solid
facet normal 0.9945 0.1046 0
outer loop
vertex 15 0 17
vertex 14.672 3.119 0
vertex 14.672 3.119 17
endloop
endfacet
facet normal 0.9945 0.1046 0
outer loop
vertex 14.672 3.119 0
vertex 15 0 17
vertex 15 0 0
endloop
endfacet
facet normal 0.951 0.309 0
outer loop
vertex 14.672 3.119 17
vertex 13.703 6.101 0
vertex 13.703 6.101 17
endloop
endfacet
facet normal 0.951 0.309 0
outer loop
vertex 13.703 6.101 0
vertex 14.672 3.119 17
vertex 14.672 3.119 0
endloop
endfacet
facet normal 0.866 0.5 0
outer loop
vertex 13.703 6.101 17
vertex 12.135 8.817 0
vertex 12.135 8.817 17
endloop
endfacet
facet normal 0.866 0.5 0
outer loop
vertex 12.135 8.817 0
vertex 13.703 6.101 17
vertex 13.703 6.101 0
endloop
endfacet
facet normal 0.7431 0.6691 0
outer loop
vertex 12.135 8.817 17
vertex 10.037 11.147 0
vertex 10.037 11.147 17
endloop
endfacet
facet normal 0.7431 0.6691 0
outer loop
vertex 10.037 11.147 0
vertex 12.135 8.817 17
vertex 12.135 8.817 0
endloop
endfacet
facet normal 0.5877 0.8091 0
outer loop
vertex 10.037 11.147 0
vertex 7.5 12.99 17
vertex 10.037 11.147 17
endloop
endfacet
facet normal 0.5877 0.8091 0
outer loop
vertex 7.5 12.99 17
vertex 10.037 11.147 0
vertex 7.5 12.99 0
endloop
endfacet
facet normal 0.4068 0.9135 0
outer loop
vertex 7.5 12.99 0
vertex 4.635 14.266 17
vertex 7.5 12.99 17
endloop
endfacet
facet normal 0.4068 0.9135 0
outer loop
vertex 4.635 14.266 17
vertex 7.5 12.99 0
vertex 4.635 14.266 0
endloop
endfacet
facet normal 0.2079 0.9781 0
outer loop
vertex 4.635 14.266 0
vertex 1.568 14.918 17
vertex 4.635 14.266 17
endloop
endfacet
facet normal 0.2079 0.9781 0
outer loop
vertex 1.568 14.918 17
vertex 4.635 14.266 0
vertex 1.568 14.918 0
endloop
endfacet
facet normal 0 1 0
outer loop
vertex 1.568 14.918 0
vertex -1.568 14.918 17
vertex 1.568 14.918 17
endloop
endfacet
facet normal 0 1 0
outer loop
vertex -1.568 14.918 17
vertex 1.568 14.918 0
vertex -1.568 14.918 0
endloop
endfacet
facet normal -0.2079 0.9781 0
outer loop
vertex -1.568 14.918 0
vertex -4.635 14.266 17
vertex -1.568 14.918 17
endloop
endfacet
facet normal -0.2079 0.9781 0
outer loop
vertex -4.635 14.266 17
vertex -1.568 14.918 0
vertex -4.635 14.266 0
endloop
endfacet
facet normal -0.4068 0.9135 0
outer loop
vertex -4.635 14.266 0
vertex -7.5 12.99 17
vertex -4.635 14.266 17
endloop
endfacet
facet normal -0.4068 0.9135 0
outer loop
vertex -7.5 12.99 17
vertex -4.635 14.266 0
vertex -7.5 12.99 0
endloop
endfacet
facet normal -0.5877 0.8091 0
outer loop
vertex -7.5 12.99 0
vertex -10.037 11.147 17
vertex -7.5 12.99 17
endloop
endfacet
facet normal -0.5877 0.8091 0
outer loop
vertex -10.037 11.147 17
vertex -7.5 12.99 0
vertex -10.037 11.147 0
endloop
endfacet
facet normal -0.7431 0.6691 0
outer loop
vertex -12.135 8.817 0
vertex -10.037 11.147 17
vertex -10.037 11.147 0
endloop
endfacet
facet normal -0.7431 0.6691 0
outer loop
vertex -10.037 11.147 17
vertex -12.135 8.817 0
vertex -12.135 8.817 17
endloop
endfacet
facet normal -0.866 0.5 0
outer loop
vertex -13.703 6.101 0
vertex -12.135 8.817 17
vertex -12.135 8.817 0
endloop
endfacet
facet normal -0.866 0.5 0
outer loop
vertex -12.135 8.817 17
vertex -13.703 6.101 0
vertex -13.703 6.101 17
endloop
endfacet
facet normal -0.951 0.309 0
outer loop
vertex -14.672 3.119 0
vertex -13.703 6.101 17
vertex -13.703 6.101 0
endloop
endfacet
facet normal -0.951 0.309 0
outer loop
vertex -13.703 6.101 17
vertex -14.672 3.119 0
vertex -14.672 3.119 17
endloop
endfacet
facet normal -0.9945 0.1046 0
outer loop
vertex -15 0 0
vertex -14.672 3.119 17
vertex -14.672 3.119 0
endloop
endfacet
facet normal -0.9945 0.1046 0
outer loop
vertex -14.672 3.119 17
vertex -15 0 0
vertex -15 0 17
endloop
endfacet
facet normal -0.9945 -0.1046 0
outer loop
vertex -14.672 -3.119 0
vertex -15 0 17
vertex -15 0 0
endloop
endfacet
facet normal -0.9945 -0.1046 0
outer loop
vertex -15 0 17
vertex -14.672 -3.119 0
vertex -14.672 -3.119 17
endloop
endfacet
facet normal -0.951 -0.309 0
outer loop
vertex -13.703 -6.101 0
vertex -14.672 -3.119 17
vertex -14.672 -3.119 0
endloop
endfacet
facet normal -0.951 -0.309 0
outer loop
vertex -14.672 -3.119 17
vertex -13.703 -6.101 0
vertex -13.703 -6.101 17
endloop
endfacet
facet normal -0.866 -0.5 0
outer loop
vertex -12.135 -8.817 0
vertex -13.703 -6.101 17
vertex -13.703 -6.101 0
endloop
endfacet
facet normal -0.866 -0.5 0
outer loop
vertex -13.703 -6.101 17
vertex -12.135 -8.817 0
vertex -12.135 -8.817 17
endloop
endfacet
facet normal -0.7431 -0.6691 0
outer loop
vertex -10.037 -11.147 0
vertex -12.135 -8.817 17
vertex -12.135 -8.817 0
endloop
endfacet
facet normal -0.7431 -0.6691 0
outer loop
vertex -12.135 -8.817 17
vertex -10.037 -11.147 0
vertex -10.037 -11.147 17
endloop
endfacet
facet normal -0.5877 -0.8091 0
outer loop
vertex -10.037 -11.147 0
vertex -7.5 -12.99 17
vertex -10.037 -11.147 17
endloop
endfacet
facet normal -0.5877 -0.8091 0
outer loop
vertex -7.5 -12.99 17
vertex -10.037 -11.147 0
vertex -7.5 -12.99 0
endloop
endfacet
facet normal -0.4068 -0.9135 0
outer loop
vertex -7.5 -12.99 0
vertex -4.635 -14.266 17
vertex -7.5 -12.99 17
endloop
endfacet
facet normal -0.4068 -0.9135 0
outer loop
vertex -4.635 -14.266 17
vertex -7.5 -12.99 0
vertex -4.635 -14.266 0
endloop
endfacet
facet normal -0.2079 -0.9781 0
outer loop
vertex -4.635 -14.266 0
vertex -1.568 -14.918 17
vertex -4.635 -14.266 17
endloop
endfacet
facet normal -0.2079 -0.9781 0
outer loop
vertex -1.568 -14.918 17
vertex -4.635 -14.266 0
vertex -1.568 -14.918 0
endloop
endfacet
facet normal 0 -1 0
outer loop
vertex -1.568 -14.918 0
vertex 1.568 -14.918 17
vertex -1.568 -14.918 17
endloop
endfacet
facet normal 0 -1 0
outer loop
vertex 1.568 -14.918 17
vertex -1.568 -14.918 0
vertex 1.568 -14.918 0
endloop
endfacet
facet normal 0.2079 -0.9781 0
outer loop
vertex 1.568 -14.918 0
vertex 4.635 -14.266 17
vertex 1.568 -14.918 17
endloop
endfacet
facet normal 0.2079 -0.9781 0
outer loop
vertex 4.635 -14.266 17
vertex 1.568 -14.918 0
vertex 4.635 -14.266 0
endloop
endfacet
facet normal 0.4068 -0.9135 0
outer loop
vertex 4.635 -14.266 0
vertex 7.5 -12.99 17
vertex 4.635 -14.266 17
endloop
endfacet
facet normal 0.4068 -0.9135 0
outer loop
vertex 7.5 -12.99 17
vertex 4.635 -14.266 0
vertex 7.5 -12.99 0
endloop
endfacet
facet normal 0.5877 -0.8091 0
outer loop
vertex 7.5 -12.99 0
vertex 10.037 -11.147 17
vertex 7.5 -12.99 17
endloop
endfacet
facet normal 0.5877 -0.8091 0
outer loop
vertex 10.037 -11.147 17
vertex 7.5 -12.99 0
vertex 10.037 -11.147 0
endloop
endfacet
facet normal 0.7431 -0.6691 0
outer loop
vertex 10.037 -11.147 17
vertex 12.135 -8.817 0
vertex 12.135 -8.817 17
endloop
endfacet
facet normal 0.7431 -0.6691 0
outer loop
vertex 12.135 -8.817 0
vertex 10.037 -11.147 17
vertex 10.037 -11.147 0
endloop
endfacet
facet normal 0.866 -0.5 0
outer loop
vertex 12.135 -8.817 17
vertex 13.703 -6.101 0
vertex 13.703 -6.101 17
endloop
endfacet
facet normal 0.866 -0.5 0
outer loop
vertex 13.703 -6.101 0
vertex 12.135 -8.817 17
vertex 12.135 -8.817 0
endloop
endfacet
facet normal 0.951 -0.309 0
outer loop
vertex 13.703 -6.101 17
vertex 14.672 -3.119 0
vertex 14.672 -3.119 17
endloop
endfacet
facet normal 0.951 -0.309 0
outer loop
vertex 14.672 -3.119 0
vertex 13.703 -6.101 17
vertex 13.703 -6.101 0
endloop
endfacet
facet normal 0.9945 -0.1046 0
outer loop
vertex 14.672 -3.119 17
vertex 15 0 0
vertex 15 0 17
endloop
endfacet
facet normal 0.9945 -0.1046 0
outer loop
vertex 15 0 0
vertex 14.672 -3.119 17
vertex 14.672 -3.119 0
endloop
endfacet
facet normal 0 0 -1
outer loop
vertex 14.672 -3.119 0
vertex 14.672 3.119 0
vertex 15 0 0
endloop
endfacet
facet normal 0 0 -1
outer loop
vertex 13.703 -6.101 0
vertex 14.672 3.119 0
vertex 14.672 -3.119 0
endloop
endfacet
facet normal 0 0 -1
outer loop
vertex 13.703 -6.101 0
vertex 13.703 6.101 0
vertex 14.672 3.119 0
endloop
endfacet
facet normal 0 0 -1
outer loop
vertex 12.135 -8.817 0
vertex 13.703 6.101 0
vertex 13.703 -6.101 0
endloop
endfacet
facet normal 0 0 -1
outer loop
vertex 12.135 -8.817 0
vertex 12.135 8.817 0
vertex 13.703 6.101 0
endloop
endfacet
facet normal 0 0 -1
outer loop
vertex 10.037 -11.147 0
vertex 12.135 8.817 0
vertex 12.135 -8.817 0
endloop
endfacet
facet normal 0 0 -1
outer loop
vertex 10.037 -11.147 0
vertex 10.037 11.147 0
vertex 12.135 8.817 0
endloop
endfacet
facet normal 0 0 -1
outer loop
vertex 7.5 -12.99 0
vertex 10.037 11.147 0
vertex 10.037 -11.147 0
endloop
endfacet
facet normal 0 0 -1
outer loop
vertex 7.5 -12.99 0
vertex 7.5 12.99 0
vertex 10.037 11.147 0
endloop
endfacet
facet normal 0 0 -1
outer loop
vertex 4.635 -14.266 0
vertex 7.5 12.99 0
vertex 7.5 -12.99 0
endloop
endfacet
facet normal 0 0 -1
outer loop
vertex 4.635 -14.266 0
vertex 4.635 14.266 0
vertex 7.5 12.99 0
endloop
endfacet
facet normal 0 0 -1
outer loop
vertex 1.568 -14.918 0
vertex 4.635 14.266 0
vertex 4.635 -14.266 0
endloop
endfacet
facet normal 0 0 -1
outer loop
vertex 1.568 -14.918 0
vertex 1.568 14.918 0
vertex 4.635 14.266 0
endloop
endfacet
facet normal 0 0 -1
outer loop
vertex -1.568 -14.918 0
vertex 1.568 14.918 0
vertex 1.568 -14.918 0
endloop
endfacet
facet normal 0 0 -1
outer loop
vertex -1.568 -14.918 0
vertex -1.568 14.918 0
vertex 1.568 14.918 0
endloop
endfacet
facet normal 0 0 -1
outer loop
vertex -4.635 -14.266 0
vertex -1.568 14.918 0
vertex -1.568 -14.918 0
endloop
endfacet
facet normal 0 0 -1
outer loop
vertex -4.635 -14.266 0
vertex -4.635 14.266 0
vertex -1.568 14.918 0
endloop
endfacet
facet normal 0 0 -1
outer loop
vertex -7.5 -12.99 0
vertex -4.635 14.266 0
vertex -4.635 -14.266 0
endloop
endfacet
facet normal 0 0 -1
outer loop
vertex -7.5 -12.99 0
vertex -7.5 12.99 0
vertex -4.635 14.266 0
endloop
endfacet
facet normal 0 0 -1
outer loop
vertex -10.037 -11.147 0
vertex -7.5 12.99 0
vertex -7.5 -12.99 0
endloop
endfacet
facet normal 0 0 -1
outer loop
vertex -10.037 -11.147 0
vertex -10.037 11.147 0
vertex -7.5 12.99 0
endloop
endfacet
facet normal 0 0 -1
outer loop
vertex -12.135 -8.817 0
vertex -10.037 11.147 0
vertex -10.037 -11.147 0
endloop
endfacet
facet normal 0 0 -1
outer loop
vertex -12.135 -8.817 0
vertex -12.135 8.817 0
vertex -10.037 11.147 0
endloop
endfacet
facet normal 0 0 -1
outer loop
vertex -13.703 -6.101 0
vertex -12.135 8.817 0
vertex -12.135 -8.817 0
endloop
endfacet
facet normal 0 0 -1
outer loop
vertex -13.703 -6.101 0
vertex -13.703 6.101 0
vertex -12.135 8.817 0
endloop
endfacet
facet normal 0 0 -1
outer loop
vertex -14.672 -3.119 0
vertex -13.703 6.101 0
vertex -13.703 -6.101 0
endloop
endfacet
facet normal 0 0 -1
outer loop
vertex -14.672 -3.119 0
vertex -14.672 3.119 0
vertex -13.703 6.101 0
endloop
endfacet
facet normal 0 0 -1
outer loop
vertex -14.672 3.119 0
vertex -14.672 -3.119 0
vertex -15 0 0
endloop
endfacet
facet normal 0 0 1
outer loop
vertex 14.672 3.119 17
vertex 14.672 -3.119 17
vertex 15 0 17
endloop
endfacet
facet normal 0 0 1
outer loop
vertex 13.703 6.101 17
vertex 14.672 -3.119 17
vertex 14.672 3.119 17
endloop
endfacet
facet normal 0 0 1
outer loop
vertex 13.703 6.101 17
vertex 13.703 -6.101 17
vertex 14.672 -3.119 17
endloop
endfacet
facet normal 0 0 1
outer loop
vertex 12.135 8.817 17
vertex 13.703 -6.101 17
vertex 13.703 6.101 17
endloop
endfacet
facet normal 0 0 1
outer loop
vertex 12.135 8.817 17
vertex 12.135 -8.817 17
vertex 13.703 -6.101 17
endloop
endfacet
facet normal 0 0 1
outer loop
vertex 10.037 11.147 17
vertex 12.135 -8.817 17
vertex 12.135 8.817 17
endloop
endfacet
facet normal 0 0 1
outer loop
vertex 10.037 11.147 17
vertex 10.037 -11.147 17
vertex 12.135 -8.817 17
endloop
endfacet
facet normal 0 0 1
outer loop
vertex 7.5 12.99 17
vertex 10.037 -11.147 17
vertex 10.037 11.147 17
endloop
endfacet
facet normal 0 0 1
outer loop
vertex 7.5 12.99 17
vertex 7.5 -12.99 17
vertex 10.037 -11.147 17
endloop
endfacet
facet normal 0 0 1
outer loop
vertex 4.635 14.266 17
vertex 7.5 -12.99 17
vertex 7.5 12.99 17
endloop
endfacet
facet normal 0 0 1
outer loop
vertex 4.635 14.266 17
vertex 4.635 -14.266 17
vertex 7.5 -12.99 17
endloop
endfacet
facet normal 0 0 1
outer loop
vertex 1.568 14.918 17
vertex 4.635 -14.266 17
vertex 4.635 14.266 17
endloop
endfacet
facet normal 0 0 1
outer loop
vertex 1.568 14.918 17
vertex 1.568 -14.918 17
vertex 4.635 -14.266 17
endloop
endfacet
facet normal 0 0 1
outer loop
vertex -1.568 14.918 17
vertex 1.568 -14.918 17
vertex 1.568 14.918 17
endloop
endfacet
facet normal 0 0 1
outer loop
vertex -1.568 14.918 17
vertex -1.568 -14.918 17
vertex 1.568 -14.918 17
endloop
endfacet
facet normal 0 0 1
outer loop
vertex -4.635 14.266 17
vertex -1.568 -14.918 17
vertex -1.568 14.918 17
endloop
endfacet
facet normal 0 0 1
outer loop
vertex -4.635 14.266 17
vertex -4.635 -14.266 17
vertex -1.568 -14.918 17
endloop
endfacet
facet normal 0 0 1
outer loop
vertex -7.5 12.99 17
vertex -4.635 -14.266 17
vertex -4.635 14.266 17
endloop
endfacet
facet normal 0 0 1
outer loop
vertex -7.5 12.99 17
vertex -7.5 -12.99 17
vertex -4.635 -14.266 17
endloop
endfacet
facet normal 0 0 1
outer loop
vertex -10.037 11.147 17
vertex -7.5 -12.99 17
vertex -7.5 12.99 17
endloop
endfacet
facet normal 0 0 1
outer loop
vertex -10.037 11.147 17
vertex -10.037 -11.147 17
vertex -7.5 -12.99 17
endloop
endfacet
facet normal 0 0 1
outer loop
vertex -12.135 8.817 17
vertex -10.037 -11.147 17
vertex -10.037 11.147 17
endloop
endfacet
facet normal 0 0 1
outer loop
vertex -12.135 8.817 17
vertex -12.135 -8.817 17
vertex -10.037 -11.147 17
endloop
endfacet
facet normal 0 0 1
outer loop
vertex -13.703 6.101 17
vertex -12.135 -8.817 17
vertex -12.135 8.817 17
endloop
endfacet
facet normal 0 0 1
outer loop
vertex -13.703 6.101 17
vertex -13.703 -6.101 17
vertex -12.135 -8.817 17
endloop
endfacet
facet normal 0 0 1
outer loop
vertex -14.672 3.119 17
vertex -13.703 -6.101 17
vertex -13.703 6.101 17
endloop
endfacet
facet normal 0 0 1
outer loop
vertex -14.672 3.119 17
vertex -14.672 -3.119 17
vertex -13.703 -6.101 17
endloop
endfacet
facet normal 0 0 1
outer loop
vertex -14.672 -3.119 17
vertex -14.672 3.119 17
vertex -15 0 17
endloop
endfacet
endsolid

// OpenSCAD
// Generated by SolidPython 1.0.1 on 2020-07-29 00:46:45


cylinder(h = 17, r1 = 15, r2 = 15);
/***********************************************
*********      SolidPython code:      **********
************************************************
 
# import packages: SolidPython
from solid import *
from solid.utils import *
from itertools import chain, combinations, permutations


class Resize:

    def __init__(self, scad_file):
        self.scad_file = scad_file
        #self.scad_file = import_scad(scad_file)
        # cone/cylinder param:
        self.r1 = 0
        self.r2 = 0
        self.h = 0
        # rectangular prism param:
        self.w = 0
        self.l = 0
        # ellipse param:
        self.r = 0

    # import OpenScad code (file name corresponds to shape)


    # classify shape + parameters
    def assign(self, param1, param2, param3):
        if self.scad_file == 'cone.scad':
            self.r1 = param1
            self.r2 = param2
            self.h = param3
        elif self.scad_file == 'cylinder.scad':
            self.r1 = param1
            self.r2 = param2
            self.h = param3
        elif self.scad_file == 'rectangularPrism.scad':
            self.h = param1
            self.l = param2
            self.w = param3
        else:
            self.r = param1
            self.h = param2

    # resize parameters
    def iterate(self):
        x = range(3, 20, 2)
        i = 1
        if self.scad_file == 'cone.scad':
            tempList = list(permutations(x, 2))
            for temp in tempList:
                param1 = temp[0]
                param2 = temp[1]
                filepath = 'produced_scad_files/' + 'cone' + str(param1) + '_' + str(param2) + '_' + '.scad'
                scad_render_to_file(cylinder(h=param1, r1=param2, r2=0), filepath)

        elif self.scad_file == 'cylinder.scad':
            tempList = list(permutations(x, 3))
            for temp in tempList:
                param1 = temp[0]
                param2 = temp[1]
                filepath = 'produced_scad_files/' + 'cylinder' + str(param1) + '_' + str(param2) + '_' + '.scad'
                scad_render_to_file(cylinder(h=param1, r1=param2, r2=param2), filepath)

        elif self.scad_file == 'rectangularPrism.scad':
            tempList = list(permutations(x, 3))
            for temp in tempList:
                param1 = temp[0]
                param2 = temp[1]
                param3 = temp[2]
                filepath = 'produced_scad_files/' + 'rectangularPrism' + str(param1) + '_' + str(param2) + '_' + str(
                    param3) + '.scad'
                scad_render_to_file(cube(size=(param1, param2, param3)), filepath)

        elif self.scad_file == 'ellipse.scad':
            tempList = list(permutations(x, 4))
            for temp in tempList:
                param1 = temp[0]
                param2 = temp[1]
                param3 = temp[2]
                param4 = temp[3]
                filepath = 'produced_scad_files/' + 'ellipse' + str(param1) + '_' + str(param2) + '_' + str(param3) + '_' + str(param4) + '.scad'
                scad_render_to_file(scale([param1, param2, param3])(sphere(r=param4)), filepath)

    def render_to_scadfile(self):
        scad_render_to_file(scad, 'example.scad') 
 
************************************************/
